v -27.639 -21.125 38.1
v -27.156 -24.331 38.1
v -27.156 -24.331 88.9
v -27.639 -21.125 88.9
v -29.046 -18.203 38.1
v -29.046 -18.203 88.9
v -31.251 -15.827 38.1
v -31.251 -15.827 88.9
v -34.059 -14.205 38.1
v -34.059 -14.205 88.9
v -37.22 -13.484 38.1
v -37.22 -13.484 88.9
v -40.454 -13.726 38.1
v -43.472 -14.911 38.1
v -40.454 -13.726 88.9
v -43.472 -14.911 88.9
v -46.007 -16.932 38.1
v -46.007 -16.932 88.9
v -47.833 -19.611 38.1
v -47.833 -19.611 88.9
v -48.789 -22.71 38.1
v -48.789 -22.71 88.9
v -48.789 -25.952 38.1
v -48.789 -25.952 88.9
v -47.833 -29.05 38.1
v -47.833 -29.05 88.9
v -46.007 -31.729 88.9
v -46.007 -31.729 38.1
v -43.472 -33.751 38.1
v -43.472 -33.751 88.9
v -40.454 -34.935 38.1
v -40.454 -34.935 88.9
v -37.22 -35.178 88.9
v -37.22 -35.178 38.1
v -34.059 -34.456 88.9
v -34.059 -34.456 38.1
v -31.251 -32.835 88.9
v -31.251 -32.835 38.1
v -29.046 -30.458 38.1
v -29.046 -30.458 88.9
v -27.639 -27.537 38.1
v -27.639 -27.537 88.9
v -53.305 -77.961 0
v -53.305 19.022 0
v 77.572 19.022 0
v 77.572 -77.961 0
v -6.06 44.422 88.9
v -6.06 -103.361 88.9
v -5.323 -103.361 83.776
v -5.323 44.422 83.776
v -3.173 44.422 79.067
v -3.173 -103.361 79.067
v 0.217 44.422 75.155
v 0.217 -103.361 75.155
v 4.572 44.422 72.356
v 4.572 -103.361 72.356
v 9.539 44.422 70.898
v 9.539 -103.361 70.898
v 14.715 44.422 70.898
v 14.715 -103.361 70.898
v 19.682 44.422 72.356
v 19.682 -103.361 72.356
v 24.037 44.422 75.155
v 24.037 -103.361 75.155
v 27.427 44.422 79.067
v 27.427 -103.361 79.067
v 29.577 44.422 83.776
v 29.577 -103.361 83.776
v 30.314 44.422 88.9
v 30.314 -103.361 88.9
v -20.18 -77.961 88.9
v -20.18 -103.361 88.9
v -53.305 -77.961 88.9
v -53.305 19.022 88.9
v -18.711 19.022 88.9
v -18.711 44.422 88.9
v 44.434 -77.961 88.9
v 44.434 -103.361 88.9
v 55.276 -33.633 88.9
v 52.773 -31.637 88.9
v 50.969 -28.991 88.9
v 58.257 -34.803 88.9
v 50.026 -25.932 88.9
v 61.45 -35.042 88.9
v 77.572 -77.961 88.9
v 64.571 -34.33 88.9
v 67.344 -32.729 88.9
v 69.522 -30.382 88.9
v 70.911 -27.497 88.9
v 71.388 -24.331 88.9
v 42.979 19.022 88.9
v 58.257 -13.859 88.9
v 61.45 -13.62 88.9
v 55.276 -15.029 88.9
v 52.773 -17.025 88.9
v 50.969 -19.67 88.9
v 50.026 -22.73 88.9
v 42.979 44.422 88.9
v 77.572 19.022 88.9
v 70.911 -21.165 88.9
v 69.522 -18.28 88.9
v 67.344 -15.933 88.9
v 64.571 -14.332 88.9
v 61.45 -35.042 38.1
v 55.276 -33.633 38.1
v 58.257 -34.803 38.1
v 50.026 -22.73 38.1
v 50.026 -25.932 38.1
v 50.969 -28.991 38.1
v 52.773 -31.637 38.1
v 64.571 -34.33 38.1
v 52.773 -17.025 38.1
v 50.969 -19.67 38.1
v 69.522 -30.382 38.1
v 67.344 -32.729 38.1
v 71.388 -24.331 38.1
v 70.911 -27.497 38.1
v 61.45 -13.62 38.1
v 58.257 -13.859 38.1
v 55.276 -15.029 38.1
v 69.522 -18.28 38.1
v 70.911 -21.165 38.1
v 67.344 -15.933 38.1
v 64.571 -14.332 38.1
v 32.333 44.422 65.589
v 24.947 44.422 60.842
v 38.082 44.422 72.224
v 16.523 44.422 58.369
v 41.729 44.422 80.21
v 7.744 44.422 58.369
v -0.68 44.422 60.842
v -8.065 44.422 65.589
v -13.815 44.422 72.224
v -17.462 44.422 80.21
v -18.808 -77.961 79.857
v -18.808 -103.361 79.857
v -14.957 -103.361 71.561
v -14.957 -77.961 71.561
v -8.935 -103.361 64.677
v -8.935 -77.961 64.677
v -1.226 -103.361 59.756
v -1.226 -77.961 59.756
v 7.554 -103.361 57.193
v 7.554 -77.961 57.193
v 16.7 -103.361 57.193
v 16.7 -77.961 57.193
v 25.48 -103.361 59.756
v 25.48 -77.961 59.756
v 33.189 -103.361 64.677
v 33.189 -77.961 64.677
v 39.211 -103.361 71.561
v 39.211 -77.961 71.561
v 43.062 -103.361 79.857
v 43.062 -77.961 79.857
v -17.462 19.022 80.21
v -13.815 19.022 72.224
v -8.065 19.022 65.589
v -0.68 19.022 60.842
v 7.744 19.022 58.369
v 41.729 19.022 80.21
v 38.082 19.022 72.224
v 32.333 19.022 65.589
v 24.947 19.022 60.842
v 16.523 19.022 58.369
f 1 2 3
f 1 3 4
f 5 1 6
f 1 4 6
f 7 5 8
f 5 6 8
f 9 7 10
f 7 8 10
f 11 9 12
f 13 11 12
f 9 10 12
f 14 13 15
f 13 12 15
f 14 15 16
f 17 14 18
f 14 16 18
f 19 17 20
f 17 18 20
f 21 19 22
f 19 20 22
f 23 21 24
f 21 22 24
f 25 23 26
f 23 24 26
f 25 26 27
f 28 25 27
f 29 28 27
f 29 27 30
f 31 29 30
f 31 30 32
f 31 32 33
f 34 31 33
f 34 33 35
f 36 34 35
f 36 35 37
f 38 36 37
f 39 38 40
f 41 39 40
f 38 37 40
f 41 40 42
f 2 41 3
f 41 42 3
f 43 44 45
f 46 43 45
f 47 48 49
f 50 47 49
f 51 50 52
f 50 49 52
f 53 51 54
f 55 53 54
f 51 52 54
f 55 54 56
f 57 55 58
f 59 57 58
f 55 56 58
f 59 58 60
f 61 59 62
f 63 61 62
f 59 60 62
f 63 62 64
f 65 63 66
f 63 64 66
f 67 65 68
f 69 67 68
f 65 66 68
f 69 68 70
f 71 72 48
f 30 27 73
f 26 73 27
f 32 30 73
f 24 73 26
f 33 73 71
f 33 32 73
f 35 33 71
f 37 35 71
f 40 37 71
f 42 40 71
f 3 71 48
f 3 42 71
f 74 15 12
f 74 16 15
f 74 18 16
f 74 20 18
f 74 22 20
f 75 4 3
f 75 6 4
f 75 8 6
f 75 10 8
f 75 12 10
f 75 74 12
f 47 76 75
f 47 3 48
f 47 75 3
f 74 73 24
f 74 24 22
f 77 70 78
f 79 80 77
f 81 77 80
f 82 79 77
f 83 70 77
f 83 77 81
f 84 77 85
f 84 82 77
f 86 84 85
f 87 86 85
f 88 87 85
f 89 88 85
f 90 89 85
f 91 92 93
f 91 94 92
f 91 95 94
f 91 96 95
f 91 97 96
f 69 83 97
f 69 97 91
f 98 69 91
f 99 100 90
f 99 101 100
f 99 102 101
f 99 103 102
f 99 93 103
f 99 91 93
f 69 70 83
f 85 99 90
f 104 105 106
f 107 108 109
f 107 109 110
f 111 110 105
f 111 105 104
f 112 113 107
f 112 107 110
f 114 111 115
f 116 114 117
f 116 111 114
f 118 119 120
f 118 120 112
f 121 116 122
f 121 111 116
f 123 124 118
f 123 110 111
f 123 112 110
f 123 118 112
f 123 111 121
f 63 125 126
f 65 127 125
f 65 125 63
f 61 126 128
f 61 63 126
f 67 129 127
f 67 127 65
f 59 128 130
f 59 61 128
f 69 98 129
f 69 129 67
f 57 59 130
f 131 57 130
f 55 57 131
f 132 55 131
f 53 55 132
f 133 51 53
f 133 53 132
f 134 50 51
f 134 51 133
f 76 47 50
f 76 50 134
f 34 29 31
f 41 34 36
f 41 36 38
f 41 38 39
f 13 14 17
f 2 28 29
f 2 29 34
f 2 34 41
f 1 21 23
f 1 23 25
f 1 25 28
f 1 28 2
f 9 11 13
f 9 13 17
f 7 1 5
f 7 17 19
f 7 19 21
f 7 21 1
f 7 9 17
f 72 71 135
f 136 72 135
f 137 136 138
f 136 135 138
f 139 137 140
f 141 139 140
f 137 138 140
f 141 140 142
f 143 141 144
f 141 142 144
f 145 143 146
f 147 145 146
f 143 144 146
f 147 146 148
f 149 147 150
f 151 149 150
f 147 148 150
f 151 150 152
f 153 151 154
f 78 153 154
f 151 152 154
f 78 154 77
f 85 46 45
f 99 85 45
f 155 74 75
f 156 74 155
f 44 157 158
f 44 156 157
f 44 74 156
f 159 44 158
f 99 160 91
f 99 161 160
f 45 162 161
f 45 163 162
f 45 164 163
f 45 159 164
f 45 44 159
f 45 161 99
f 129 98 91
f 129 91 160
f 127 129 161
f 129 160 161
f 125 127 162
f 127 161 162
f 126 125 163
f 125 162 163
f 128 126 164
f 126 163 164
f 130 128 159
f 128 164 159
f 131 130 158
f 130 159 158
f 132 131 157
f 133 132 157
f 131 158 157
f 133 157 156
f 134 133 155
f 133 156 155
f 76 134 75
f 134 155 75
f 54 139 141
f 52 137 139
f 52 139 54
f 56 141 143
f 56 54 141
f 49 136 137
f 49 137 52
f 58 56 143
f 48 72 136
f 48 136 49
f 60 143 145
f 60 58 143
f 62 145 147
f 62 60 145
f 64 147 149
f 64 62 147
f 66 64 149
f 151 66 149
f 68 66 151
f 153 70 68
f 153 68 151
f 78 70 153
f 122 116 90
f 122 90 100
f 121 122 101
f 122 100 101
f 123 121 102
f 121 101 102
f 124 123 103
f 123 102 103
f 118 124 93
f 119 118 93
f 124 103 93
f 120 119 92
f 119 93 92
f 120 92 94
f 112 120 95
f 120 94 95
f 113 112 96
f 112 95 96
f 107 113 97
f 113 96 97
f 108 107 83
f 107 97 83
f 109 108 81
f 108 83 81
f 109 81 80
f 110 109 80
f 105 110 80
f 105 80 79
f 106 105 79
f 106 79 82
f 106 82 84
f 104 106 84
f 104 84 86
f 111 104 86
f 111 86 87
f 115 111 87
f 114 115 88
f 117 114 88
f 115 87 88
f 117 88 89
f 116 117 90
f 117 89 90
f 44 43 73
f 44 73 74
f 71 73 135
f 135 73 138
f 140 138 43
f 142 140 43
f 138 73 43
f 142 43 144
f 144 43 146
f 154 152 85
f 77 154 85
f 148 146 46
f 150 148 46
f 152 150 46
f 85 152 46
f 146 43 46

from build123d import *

# Parameters (mm, degrees)
F0_W     = 130.8771371841
F0_H     = 96.983704716
F1_DEPTH = 88.9
F3_DEPTH = 25.4
F5_DEPTH = 25.4
F6_R     = 18.1870915774
F7_DEPTH = 147.784704716
F8_R     = 10.7412616006
F8_R_2   = 10.8772665054
F9_DEPTH = 50.8


with BuildPart() as f1:
    # F0 (on Top) → F1 (new body)
    with BuildSketch(Plane.XY):
        with Locations((12.1337100863, -29.4696222991)):
            Rectangle(F0_W, F0_H)
    extrude(amount=F1_DEPTH)

    # F2 (on face) → F3 (join)
    with BuildSketch(Plane(origin=(0, 19.0222300589, 0), x_dir=(-1, 0, 0), z_dir=(0, 1, 0))):
        with BuildLine():
            Line((18.7113173306, 88.9), (-42.9787375033, 88.9))
            ThreePointArc((-42.9787375033, 88.9), (-12.1337100863, 58.0549725831), (18.7113173306, 88.9))
        make_face()
    extrude(amount=F3_DEPTH)

    # F4 (on face) → F5 (join)
    with BuildSketch(Plane.XZ.offset(77.9614746571)):
        with BuildLine():
            Line((44.4338358939, 88.9), (-20.1796386391, 88.9))
            ThreePointArc((-20.1796386391, 88.9), (12.1270986274, 56.8678088056), (44.4338358939, 88.9))
        make_face()
    extrude(amount=F5_DEPTH)

    # F6 (on face) → F7 (cut, through all)
    with BuildSketch(Plane.XZ.offset(103.3614746571)):
        with Locations((12.1270986274, 88.9)):
            Circle(F6_R)
    extrude(amount=-F7_DEPTH, mode=Mode.SUBTRACT)

    # F8 (on face) → F9 (cut)
    with BuildSketch(Plane.XY.offset(88.9)):
        with Locations((60.6468096375, -24.3307966739)):
            Circle(F8_R)
        with Locations((-38.0332432687, -24.3307966739)):
            Circle(F8_R_2)
    extrude(amount=-F9_DEPTH, mode=Mode.SUBTRACT)


solid = f1.part
